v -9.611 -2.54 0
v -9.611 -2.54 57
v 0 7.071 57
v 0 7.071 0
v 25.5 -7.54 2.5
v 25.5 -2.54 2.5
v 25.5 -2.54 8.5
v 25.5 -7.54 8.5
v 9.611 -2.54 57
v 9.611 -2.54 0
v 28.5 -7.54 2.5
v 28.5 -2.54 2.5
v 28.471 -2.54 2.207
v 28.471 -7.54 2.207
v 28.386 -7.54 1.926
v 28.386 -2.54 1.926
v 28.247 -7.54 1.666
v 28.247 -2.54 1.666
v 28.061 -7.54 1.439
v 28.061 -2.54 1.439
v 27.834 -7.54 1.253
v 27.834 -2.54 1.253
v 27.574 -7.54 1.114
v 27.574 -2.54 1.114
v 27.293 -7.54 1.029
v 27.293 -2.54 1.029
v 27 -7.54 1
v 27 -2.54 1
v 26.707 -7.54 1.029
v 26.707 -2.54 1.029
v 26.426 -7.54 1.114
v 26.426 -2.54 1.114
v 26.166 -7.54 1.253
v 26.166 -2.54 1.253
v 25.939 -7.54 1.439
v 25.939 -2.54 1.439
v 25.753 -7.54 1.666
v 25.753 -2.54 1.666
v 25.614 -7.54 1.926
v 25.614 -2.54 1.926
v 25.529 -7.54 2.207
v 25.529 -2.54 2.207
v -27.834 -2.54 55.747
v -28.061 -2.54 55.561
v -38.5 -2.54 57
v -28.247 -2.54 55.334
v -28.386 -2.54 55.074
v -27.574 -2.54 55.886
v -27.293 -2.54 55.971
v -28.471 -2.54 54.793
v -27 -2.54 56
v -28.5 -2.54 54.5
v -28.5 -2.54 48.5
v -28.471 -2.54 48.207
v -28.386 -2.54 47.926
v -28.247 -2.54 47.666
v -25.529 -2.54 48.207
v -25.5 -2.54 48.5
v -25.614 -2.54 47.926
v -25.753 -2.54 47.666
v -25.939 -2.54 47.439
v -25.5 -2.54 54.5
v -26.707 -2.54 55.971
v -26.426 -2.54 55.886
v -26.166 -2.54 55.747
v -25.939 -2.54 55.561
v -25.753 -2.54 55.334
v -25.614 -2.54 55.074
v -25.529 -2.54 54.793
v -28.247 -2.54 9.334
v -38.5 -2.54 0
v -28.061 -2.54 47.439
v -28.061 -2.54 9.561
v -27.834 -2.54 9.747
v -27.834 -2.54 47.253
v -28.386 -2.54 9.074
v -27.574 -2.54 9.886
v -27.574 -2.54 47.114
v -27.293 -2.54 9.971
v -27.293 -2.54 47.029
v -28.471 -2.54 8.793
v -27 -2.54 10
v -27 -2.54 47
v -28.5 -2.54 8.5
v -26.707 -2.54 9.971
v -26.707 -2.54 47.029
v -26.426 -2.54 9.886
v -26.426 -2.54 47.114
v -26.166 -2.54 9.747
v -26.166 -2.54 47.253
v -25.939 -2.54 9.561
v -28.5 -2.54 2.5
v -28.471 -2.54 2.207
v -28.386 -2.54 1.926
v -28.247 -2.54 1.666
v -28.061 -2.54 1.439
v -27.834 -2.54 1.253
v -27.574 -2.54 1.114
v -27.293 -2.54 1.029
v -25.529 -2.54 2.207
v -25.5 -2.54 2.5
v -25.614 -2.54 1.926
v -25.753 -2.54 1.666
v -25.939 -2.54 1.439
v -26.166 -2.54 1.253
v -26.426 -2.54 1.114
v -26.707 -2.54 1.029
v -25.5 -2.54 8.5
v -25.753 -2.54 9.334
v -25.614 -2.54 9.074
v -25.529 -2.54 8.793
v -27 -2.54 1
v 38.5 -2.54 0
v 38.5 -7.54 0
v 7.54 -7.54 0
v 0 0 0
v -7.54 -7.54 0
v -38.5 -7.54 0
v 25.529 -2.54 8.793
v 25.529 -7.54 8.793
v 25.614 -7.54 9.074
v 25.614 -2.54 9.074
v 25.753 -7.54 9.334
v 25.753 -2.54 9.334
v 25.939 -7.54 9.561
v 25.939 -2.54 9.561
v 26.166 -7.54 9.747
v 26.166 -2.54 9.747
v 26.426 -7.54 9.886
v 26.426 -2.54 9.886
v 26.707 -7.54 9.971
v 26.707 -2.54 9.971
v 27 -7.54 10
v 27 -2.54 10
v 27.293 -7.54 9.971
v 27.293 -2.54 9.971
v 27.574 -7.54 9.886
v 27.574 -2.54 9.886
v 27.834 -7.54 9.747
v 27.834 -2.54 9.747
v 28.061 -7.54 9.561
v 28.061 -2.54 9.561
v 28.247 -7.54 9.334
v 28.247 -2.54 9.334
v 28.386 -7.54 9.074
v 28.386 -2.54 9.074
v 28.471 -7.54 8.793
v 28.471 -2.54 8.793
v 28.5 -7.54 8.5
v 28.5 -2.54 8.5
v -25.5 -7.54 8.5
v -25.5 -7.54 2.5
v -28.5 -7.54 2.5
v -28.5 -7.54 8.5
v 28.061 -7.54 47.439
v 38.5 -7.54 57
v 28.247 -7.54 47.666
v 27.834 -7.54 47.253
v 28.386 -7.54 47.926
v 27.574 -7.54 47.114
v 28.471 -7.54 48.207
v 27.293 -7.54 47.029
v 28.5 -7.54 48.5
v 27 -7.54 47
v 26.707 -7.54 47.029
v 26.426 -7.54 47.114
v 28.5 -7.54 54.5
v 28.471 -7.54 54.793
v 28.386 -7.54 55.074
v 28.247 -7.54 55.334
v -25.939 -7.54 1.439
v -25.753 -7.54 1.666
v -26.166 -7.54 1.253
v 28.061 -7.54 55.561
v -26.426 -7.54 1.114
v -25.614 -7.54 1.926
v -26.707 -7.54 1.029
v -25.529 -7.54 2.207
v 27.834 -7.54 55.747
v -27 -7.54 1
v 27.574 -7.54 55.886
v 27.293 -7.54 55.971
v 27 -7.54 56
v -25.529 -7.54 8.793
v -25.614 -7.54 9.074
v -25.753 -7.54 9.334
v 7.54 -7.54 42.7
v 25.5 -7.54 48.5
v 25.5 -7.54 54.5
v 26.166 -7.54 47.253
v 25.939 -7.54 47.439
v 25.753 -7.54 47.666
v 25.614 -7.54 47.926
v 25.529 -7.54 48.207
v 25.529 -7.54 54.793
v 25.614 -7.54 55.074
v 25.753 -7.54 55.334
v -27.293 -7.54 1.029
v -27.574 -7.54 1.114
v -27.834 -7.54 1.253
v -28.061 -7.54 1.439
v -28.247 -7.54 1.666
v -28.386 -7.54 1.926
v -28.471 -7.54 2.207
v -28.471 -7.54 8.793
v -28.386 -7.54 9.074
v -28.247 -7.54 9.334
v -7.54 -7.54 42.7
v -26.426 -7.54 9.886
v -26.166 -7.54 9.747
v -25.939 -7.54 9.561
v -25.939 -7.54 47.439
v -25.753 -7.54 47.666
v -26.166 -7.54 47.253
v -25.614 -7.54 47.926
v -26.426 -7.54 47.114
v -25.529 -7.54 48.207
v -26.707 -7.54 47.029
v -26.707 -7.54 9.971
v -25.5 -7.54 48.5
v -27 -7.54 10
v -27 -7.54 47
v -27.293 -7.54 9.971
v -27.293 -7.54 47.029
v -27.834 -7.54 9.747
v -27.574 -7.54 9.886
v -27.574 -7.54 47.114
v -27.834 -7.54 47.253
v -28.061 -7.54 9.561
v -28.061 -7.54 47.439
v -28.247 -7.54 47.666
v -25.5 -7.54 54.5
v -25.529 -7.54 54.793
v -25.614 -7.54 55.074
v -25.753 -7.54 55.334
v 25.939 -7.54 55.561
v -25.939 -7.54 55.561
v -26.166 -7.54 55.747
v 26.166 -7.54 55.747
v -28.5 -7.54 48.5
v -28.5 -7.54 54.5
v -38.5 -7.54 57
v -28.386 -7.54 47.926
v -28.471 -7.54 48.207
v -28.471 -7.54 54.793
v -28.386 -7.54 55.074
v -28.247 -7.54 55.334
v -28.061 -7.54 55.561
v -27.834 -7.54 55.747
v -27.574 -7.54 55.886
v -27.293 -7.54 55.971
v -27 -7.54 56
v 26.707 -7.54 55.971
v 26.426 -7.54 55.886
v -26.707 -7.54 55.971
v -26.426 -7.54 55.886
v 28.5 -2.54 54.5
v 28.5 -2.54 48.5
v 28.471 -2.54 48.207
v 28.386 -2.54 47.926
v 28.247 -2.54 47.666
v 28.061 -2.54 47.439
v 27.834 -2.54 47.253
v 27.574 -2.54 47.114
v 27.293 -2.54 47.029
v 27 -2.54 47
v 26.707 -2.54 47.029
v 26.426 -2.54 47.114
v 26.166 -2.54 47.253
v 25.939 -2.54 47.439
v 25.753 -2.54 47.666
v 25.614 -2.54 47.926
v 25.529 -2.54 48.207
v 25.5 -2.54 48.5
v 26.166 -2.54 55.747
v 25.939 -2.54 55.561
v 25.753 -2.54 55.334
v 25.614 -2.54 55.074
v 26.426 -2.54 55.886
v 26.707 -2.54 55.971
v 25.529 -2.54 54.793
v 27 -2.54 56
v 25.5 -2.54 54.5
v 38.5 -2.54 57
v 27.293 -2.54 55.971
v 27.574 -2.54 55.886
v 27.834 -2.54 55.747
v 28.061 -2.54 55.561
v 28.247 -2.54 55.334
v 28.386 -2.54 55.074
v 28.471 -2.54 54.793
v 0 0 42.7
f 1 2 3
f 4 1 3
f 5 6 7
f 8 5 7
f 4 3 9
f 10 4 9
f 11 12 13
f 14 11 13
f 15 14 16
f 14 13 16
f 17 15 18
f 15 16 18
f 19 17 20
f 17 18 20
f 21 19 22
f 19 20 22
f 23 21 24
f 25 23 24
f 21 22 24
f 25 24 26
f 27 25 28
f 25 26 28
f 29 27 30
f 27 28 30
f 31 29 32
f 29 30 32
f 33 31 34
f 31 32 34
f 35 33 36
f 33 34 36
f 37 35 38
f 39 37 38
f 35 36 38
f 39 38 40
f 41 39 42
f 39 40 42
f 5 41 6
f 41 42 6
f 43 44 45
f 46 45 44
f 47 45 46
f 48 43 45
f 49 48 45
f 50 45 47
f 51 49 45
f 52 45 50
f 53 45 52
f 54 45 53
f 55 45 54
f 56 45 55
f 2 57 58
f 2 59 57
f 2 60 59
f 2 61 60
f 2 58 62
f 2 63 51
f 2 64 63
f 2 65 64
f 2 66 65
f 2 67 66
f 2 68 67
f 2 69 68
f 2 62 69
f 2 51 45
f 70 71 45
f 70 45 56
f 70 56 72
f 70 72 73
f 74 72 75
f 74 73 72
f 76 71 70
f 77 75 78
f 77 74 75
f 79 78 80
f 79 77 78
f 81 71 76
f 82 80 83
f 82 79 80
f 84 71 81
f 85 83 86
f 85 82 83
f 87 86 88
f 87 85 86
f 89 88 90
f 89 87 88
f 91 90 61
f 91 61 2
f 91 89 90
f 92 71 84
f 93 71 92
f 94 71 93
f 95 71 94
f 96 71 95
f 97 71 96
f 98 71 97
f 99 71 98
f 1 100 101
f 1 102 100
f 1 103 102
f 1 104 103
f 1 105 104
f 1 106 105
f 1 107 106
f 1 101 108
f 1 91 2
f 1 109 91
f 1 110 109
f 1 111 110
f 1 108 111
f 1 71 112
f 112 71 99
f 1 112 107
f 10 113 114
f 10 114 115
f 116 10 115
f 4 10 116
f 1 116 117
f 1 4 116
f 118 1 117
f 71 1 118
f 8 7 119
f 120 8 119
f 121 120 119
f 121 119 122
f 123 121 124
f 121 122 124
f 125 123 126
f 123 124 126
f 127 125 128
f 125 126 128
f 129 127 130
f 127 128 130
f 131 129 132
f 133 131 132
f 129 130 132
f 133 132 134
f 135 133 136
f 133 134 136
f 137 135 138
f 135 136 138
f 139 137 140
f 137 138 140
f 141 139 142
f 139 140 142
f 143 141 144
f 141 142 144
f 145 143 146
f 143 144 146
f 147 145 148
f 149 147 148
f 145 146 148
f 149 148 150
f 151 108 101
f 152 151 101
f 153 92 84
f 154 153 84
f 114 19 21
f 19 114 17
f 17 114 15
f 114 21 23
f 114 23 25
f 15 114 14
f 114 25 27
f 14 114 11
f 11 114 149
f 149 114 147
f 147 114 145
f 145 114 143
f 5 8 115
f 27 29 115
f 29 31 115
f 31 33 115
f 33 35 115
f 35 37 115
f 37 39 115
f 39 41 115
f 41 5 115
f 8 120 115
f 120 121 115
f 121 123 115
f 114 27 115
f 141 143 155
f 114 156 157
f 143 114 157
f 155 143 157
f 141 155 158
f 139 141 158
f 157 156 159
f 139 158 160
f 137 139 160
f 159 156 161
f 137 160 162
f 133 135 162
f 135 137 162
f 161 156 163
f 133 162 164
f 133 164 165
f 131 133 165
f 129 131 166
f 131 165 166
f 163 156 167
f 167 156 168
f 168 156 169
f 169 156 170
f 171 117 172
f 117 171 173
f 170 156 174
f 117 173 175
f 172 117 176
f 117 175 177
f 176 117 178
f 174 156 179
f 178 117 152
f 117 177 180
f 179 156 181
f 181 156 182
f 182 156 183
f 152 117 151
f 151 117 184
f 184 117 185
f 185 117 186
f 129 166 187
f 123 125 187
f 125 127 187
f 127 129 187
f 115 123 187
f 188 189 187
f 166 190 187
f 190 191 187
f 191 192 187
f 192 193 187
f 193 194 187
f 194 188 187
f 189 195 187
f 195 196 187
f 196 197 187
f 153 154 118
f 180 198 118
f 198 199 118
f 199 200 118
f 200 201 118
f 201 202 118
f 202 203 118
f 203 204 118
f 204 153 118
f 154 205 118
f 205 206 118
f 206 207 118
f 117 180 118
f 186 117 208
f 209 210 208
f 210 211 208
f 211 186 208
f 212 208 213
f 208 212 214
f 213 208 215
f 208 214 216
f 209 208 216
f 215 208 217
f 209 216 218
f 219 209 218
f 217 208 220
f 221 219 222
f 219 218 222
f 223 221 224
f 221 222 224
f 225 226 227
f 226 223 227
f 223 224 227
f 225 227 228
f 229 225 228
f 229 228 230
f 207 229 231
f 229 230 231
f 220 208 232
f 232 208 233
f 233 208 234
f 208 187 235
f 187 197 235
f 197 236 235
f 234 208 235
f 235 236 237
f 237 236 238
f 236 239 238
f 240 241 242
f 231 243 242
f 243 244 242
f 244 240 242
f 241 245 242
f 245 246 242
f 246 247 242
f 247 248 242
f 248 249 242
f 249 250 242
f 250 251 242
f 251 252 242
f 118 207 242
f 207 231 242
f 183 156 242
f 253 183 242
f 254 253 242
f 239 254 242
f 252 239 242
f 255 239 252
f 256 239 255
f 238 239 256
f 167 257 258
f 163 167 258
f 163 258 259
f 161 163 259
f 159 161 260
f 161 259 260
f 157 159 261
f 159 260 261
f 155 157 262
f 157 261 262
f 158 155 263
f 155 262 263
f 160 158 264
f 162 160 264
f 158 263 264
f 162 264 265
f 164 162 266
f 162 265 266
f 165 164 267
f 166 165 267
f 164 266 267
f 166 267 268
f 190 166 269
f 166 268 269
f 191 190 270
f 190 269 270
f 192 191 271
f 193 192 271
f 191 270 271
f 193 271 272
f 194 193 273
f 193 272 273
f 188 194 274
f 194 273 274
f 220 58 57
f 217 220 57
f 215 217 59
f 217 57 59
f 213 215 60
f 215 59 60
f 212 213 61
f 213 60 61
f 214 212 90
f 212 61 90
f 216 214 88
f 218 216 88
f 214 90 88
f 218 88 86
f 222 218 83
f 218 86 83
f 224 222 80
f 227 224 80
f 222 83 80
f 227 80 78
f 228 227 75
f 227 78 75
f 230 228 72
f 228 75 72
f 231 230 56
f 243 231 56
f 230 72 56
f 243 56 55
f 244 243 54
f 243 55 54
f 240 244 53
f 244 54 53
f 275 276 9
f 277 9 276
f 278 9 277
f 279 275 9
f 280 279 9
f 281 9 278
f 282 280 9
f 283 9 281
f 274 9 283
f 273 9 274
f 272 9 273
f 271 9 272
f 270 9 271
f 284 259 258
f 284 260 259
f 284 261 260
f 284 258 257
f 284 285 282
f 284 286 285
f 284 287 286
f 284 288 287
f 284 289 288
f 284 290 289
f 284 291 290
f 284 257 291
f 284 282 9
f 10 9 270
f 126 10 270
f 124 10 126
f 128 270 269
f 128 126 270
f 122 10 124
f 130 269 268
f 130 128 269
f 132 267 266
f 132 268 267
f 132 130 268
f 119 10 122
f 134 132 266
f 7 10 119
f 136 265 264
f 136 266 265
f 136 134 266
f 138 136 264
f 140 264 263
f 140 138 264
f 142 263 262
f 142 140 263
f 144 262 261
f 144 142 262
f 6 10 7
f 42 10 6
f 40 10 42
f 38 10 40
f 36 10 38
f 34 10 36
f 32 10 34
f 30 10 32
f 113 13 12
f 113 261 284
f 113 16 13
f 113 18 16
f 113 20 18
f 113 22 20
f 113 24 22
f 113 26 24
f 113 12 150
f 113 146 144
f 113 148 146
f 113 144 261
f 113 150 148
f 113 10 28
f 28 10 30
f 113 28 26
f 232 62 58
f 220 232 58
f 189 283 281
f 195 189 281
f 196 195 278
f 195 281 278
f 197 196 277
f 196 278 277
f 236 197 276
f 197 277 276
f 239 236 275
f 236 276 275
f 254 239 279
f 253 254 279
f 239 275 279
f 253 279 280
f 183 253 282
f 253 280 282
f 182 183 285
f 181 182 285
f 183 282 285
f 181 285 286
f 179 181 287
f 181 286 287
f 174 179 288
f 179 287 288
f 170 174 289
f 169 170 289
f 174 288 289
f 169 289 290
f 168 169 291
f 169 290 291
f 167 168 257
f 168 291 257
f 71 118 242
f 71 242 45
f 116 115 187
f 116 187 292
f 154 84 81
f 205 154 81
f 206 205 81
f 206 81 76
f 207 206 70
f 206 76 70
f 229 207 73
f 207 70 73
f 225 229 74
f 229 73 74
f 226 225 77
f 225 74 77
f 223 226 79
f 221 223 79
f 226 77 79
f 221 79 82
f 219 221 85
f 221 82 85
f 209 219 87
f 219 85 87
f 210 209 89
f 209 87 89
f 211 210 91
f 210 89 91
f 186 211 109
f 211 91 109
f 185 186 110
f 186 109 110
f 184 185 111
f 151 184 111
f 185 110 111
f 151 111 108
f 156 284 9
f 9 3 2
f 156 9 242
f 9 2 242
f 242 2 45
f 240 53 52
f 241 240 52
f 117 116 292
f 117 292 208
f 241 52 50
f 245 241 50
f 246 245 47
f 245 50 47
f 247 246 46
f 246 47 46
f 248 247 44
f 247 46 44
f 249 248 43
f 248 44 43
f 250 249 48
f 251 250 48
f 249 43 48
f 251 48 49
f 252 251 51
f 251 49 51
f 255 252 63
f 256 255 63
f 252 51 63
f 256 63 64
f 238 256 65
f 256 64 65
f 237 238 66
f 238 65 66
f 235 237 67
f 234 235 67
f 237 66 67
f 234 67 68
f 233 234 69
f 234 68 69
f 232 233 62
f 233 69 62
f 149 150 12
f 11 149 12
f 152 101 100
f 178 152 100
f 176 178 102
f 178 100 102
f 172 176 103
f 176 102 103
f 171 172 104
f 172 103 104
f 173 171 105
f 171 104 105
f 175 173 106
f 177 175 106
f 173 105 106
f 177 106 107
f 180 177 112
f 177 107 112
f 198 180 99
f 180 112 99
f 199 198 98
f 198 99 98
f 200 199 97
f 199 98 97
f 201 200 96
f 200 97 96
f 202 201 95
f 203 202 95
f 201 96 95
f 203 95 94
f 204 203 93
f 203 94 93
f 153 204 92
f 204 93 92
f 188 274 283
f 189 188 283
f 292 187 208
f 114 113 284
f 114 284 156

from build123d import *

# Parameters (mm, degrees)
BOSS_EXTRUDE1_DEPTH = 57
BOSS_EXTRUDE2_DEPTH = 14.3
CUT_EXTRUDE1_DEPTH  = 10


with BuildPart() as part:
    # Sketch1 → Boss-Extrude1 (new body)
    with BuildSketch(Plane.XY):
        Polygon((0, 0), (-7.54, -7.54), (-38.5, -7.54), (-38.5, -2.54), (-9.611067812, -2.54), (0, 7.071067812), (9.611067812, -2.54), (38.5, -2.54), (38.5, -7.54), (7.54, -7.54), align=None)
    extrude(amount=BOSS_EXTRUDE1_DEPTH)

    # Sketch2 → Boss-Extrude2 (add)
    with BuildSketch(Plane.XY.offset(57)):
        Polygon((-7.54, -7.54), (0, 0), (7.54, -7.54), align=None)
    extrude(amount=-BOSS_EXTRUDE2_DEPTH)

    # Sketch3 → Cut-Extrude1 (cut)
    with BuildSketch(Plane(origin=(0, -2.54, 0), x_dir=(1, 0, 0), z_dir=(0, 1, 0))):
        with BuildLine():
            Line((-28.500315349, -48.5), (-28.500315349, -54.5))
            ThreePointArc((-28.500315349, -54.5), (-27, -56.000315349), (-25.499684651, -54.5))
            Line((-25.499684651, -54.5), (-25.499684651, -48.5))
            ThreePointArc((-25.499684651, -48.5), (-27, -46.999684651), (-28.500315349, -48.5))
        make_face()
        with BuildLine():
            Line((25.499684651, -2.5), (25.499684651, -8.5))
            ThreePointArc((25.499684651, -8.5), (27, -10.000315349), (28.500315349, -8.5))
            Line((28.500315349, -8.5), (28.500315349, -2.5))
            ThreePointArc((28.500315349, -2.5), (27, -0.999684651), (25.499684651, -2.5))
        make_face()
        with BuildLine():
            Line((-28.500315349, -2.5), (-28.500315349, -8.5))
            ThreePointArc((-28.500315349, -8.5), (-27, -10.000315349), (-25.499684651, -8.5))
            Line((-25.499684651, -8.5), (-25.499684651, -2.5))
            ThreePointArc((-25.499684651, -2.5), (-27, -0.999684651), (-28.500315349, -2.5))
        make_face()
        with BuildLine():
            Line((25.499684651, -48.5), (25.499684651, -54.5))
            ThreePointArc((25.499684651, -54.5), (27, -56.000315349), (28.500315349, -54.5))
            Line((28.500315349, -54.5), (28.500315349, -48.5))
            ThreePointArc((28.500315349, -48.5), (27, -46.999684651), (25.499684651, -48.5))
        make_face()
    extrude(amount=-CUT_EXTRUDE1_DEPTH, mode=Mode.SUBTRACT)


solid = part.part
